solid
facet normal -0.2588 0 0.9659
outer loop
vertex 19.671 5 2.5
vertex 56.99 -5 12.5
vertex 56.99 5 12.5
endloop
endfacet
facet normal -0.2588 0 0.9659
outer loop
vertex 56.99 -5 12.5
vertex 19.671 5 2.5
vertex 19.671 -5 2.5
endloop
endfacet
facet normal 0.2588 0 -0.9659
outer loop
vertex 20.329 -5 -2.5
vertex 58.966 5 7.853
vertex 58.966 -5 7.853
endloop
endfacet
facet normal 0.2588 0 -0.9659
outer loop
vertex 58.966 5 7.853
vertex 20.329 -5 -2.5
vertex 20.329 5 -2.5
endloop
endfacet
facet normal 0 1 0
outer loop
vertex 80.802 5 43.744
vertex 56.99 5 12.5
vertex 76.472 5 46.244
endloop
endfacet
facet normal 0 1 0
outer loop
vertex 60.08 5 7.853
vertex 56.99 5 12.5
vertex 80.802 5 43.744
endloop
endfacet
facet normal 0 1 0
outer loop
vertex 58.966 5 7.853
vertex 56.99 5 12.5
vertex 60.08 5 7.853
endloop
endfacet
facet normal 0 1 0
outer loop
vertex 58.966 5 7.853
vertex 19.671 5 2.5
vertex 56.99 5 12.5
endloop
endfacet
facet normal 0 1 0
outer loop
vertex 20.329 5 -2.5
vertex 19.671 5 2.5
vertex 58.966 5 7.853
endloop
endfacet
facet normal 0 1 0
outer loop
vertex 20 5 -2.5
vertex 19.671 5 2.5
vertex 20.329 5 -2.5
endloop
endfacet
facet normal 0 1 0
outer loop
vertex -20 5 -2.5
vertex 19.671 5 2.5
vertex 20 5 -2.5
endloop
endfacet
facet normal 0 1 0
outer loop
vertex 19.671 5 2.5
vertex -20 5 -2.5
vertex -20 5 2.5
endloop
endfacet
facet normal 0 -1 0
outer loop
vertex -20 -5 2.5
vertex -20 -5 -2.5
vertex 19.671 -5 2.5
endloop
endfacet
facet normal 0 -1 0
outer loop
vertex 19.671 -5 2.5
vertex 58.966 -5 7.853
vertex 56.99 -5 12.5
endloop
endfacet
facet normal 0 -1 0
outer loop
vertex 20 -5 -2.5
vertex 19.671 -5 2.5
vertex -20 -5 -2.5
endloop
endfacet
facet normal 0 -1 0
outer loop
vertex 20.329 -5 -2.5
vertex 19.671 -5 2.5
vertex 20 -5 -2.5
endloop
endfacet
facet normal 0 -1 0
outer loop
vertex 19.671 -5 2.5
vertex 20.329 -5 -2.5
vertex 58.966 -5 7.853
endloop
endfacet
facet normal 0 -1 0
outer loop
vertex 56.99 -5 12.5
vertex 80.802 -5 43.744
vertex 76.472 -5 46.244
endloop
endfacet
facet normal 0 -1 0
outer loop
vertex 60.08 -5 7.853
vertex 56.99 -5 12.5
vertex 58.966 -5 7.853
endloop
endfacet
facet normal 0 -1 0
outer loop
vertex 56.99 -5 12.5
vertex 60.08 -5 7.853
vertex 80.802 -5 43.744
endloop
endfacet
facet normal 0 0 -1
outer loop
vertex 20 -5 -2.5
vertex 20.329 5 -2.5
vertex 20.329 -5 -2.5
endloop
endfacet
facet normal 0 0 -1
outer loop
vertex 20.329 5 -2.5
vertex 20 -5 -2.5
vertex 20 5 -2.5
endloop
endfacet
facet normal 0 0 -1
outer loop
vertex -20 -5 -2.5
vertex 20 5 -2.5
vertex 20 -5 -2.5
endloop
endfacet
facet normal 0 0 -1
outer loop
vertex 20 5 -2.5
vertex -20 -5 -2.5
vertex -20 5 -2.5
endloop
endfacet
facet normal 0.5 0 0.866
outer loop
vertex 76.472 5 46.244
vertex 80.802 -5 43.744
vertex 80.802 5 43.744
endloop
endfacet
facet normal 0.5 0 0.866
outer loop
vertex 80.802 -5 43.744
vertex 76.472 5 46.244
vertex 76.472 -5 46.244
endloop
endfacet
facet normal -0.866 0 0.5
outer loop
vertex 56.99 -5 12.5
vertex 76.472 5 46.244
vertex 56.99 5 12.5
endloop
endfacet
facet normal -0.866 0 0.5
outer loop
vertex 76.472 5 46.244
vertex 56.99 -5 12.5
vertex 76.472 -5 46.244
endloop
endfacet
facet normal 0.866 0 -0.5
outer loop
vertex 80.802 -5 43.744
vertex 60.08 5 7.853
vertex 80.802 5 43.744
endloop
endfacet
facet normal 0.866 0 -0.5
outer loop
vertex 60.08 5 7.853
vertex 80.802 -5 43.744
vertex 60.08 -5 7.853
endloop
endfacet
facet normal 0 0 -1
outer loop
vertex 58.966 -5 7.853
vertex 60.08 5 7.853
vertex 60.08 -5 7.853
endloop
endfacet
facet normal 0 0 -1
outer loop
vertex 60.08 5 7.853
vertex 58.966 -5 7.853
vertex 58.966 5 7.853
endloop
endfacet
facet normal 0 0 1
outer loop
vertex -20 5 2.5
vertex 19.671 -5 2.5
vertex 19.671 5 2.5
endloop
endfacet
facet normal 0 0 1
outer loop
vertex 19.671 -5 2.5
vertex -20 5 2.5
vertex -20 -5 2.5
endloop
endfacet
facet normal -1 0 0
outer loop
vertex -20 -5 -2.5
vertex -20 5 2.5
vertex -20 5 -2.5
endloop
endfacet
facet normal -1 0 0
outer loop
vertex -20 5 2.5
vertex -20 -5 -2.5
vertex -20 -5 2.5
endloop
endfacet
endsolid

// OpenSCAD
truckHolderDepth  = 10;
truckHolderWidth = 10;
truckHolderThick = 5;
truckHolderFlatLength = 40;
truckHolderDiagonalAngle1 = 360-15;
truckHolderDiagonalAngle2 = 360-60;
truckHolderDiagonal1Length = 40;
truckHolderDiagonal2Length = 40;
cutoff = 1;


//internal
yTranslateDiagonal2 = sin(180-truckHolderDiagonalAngle1) * -truckHolderDiagonal1Length;
xTranslateDiagonal2 = cos(180-truckHolderDiagonalAngle1) * truckHolderDiagonal1Length;

module truckHolderPiece(length, lengthCutoff, widthCutoff, thickCutoff) {
    cube([length+lengthCutoff, truckHolderWidth+widthCutoff, truckHolderThick+thickCutoff], center=true);
}

truckHolderPiece(truckHolderFlatLength,0,0,0);

/*
Just get this module to the center of a diagonal joint. It will do the rest. 

*/
module diagonalJoint(lastJointLength, angle, newLength, thickness) {
    difference() {
        translate([lastJointLength/2,0,0]) {
            rotate([0,angle,0]) {
                difference() {
                    truckHolderPiece(newLength*2,0,0,0);
                    translate([(newLength+thickness*2)/-2, 0,0]) truckHolderPiece(newLength-thickness*2,0,cutoff,cutoff);
                }
            }
        }
    translate([0,cutoff,truckHolderThick*-2.5]) scale([1,1+cutoff,4]) truckHolderPiece(newLength*2, 0,0,0);
    }
}


diagonalJoint(truckHolderFlatLength, truckHolderDiagonalAngle1, truckHolderDiagonal1Length, truckHolderThick);
translate([-xTranslateDiagonal2, 0, yTranslateDiagonal2]) {
    diagonalJoint(truckHolderDiagonal1Length, truckHolderDiagonalAngle2, truckHolderDiagonal2Length, truckHolderThick);
}
